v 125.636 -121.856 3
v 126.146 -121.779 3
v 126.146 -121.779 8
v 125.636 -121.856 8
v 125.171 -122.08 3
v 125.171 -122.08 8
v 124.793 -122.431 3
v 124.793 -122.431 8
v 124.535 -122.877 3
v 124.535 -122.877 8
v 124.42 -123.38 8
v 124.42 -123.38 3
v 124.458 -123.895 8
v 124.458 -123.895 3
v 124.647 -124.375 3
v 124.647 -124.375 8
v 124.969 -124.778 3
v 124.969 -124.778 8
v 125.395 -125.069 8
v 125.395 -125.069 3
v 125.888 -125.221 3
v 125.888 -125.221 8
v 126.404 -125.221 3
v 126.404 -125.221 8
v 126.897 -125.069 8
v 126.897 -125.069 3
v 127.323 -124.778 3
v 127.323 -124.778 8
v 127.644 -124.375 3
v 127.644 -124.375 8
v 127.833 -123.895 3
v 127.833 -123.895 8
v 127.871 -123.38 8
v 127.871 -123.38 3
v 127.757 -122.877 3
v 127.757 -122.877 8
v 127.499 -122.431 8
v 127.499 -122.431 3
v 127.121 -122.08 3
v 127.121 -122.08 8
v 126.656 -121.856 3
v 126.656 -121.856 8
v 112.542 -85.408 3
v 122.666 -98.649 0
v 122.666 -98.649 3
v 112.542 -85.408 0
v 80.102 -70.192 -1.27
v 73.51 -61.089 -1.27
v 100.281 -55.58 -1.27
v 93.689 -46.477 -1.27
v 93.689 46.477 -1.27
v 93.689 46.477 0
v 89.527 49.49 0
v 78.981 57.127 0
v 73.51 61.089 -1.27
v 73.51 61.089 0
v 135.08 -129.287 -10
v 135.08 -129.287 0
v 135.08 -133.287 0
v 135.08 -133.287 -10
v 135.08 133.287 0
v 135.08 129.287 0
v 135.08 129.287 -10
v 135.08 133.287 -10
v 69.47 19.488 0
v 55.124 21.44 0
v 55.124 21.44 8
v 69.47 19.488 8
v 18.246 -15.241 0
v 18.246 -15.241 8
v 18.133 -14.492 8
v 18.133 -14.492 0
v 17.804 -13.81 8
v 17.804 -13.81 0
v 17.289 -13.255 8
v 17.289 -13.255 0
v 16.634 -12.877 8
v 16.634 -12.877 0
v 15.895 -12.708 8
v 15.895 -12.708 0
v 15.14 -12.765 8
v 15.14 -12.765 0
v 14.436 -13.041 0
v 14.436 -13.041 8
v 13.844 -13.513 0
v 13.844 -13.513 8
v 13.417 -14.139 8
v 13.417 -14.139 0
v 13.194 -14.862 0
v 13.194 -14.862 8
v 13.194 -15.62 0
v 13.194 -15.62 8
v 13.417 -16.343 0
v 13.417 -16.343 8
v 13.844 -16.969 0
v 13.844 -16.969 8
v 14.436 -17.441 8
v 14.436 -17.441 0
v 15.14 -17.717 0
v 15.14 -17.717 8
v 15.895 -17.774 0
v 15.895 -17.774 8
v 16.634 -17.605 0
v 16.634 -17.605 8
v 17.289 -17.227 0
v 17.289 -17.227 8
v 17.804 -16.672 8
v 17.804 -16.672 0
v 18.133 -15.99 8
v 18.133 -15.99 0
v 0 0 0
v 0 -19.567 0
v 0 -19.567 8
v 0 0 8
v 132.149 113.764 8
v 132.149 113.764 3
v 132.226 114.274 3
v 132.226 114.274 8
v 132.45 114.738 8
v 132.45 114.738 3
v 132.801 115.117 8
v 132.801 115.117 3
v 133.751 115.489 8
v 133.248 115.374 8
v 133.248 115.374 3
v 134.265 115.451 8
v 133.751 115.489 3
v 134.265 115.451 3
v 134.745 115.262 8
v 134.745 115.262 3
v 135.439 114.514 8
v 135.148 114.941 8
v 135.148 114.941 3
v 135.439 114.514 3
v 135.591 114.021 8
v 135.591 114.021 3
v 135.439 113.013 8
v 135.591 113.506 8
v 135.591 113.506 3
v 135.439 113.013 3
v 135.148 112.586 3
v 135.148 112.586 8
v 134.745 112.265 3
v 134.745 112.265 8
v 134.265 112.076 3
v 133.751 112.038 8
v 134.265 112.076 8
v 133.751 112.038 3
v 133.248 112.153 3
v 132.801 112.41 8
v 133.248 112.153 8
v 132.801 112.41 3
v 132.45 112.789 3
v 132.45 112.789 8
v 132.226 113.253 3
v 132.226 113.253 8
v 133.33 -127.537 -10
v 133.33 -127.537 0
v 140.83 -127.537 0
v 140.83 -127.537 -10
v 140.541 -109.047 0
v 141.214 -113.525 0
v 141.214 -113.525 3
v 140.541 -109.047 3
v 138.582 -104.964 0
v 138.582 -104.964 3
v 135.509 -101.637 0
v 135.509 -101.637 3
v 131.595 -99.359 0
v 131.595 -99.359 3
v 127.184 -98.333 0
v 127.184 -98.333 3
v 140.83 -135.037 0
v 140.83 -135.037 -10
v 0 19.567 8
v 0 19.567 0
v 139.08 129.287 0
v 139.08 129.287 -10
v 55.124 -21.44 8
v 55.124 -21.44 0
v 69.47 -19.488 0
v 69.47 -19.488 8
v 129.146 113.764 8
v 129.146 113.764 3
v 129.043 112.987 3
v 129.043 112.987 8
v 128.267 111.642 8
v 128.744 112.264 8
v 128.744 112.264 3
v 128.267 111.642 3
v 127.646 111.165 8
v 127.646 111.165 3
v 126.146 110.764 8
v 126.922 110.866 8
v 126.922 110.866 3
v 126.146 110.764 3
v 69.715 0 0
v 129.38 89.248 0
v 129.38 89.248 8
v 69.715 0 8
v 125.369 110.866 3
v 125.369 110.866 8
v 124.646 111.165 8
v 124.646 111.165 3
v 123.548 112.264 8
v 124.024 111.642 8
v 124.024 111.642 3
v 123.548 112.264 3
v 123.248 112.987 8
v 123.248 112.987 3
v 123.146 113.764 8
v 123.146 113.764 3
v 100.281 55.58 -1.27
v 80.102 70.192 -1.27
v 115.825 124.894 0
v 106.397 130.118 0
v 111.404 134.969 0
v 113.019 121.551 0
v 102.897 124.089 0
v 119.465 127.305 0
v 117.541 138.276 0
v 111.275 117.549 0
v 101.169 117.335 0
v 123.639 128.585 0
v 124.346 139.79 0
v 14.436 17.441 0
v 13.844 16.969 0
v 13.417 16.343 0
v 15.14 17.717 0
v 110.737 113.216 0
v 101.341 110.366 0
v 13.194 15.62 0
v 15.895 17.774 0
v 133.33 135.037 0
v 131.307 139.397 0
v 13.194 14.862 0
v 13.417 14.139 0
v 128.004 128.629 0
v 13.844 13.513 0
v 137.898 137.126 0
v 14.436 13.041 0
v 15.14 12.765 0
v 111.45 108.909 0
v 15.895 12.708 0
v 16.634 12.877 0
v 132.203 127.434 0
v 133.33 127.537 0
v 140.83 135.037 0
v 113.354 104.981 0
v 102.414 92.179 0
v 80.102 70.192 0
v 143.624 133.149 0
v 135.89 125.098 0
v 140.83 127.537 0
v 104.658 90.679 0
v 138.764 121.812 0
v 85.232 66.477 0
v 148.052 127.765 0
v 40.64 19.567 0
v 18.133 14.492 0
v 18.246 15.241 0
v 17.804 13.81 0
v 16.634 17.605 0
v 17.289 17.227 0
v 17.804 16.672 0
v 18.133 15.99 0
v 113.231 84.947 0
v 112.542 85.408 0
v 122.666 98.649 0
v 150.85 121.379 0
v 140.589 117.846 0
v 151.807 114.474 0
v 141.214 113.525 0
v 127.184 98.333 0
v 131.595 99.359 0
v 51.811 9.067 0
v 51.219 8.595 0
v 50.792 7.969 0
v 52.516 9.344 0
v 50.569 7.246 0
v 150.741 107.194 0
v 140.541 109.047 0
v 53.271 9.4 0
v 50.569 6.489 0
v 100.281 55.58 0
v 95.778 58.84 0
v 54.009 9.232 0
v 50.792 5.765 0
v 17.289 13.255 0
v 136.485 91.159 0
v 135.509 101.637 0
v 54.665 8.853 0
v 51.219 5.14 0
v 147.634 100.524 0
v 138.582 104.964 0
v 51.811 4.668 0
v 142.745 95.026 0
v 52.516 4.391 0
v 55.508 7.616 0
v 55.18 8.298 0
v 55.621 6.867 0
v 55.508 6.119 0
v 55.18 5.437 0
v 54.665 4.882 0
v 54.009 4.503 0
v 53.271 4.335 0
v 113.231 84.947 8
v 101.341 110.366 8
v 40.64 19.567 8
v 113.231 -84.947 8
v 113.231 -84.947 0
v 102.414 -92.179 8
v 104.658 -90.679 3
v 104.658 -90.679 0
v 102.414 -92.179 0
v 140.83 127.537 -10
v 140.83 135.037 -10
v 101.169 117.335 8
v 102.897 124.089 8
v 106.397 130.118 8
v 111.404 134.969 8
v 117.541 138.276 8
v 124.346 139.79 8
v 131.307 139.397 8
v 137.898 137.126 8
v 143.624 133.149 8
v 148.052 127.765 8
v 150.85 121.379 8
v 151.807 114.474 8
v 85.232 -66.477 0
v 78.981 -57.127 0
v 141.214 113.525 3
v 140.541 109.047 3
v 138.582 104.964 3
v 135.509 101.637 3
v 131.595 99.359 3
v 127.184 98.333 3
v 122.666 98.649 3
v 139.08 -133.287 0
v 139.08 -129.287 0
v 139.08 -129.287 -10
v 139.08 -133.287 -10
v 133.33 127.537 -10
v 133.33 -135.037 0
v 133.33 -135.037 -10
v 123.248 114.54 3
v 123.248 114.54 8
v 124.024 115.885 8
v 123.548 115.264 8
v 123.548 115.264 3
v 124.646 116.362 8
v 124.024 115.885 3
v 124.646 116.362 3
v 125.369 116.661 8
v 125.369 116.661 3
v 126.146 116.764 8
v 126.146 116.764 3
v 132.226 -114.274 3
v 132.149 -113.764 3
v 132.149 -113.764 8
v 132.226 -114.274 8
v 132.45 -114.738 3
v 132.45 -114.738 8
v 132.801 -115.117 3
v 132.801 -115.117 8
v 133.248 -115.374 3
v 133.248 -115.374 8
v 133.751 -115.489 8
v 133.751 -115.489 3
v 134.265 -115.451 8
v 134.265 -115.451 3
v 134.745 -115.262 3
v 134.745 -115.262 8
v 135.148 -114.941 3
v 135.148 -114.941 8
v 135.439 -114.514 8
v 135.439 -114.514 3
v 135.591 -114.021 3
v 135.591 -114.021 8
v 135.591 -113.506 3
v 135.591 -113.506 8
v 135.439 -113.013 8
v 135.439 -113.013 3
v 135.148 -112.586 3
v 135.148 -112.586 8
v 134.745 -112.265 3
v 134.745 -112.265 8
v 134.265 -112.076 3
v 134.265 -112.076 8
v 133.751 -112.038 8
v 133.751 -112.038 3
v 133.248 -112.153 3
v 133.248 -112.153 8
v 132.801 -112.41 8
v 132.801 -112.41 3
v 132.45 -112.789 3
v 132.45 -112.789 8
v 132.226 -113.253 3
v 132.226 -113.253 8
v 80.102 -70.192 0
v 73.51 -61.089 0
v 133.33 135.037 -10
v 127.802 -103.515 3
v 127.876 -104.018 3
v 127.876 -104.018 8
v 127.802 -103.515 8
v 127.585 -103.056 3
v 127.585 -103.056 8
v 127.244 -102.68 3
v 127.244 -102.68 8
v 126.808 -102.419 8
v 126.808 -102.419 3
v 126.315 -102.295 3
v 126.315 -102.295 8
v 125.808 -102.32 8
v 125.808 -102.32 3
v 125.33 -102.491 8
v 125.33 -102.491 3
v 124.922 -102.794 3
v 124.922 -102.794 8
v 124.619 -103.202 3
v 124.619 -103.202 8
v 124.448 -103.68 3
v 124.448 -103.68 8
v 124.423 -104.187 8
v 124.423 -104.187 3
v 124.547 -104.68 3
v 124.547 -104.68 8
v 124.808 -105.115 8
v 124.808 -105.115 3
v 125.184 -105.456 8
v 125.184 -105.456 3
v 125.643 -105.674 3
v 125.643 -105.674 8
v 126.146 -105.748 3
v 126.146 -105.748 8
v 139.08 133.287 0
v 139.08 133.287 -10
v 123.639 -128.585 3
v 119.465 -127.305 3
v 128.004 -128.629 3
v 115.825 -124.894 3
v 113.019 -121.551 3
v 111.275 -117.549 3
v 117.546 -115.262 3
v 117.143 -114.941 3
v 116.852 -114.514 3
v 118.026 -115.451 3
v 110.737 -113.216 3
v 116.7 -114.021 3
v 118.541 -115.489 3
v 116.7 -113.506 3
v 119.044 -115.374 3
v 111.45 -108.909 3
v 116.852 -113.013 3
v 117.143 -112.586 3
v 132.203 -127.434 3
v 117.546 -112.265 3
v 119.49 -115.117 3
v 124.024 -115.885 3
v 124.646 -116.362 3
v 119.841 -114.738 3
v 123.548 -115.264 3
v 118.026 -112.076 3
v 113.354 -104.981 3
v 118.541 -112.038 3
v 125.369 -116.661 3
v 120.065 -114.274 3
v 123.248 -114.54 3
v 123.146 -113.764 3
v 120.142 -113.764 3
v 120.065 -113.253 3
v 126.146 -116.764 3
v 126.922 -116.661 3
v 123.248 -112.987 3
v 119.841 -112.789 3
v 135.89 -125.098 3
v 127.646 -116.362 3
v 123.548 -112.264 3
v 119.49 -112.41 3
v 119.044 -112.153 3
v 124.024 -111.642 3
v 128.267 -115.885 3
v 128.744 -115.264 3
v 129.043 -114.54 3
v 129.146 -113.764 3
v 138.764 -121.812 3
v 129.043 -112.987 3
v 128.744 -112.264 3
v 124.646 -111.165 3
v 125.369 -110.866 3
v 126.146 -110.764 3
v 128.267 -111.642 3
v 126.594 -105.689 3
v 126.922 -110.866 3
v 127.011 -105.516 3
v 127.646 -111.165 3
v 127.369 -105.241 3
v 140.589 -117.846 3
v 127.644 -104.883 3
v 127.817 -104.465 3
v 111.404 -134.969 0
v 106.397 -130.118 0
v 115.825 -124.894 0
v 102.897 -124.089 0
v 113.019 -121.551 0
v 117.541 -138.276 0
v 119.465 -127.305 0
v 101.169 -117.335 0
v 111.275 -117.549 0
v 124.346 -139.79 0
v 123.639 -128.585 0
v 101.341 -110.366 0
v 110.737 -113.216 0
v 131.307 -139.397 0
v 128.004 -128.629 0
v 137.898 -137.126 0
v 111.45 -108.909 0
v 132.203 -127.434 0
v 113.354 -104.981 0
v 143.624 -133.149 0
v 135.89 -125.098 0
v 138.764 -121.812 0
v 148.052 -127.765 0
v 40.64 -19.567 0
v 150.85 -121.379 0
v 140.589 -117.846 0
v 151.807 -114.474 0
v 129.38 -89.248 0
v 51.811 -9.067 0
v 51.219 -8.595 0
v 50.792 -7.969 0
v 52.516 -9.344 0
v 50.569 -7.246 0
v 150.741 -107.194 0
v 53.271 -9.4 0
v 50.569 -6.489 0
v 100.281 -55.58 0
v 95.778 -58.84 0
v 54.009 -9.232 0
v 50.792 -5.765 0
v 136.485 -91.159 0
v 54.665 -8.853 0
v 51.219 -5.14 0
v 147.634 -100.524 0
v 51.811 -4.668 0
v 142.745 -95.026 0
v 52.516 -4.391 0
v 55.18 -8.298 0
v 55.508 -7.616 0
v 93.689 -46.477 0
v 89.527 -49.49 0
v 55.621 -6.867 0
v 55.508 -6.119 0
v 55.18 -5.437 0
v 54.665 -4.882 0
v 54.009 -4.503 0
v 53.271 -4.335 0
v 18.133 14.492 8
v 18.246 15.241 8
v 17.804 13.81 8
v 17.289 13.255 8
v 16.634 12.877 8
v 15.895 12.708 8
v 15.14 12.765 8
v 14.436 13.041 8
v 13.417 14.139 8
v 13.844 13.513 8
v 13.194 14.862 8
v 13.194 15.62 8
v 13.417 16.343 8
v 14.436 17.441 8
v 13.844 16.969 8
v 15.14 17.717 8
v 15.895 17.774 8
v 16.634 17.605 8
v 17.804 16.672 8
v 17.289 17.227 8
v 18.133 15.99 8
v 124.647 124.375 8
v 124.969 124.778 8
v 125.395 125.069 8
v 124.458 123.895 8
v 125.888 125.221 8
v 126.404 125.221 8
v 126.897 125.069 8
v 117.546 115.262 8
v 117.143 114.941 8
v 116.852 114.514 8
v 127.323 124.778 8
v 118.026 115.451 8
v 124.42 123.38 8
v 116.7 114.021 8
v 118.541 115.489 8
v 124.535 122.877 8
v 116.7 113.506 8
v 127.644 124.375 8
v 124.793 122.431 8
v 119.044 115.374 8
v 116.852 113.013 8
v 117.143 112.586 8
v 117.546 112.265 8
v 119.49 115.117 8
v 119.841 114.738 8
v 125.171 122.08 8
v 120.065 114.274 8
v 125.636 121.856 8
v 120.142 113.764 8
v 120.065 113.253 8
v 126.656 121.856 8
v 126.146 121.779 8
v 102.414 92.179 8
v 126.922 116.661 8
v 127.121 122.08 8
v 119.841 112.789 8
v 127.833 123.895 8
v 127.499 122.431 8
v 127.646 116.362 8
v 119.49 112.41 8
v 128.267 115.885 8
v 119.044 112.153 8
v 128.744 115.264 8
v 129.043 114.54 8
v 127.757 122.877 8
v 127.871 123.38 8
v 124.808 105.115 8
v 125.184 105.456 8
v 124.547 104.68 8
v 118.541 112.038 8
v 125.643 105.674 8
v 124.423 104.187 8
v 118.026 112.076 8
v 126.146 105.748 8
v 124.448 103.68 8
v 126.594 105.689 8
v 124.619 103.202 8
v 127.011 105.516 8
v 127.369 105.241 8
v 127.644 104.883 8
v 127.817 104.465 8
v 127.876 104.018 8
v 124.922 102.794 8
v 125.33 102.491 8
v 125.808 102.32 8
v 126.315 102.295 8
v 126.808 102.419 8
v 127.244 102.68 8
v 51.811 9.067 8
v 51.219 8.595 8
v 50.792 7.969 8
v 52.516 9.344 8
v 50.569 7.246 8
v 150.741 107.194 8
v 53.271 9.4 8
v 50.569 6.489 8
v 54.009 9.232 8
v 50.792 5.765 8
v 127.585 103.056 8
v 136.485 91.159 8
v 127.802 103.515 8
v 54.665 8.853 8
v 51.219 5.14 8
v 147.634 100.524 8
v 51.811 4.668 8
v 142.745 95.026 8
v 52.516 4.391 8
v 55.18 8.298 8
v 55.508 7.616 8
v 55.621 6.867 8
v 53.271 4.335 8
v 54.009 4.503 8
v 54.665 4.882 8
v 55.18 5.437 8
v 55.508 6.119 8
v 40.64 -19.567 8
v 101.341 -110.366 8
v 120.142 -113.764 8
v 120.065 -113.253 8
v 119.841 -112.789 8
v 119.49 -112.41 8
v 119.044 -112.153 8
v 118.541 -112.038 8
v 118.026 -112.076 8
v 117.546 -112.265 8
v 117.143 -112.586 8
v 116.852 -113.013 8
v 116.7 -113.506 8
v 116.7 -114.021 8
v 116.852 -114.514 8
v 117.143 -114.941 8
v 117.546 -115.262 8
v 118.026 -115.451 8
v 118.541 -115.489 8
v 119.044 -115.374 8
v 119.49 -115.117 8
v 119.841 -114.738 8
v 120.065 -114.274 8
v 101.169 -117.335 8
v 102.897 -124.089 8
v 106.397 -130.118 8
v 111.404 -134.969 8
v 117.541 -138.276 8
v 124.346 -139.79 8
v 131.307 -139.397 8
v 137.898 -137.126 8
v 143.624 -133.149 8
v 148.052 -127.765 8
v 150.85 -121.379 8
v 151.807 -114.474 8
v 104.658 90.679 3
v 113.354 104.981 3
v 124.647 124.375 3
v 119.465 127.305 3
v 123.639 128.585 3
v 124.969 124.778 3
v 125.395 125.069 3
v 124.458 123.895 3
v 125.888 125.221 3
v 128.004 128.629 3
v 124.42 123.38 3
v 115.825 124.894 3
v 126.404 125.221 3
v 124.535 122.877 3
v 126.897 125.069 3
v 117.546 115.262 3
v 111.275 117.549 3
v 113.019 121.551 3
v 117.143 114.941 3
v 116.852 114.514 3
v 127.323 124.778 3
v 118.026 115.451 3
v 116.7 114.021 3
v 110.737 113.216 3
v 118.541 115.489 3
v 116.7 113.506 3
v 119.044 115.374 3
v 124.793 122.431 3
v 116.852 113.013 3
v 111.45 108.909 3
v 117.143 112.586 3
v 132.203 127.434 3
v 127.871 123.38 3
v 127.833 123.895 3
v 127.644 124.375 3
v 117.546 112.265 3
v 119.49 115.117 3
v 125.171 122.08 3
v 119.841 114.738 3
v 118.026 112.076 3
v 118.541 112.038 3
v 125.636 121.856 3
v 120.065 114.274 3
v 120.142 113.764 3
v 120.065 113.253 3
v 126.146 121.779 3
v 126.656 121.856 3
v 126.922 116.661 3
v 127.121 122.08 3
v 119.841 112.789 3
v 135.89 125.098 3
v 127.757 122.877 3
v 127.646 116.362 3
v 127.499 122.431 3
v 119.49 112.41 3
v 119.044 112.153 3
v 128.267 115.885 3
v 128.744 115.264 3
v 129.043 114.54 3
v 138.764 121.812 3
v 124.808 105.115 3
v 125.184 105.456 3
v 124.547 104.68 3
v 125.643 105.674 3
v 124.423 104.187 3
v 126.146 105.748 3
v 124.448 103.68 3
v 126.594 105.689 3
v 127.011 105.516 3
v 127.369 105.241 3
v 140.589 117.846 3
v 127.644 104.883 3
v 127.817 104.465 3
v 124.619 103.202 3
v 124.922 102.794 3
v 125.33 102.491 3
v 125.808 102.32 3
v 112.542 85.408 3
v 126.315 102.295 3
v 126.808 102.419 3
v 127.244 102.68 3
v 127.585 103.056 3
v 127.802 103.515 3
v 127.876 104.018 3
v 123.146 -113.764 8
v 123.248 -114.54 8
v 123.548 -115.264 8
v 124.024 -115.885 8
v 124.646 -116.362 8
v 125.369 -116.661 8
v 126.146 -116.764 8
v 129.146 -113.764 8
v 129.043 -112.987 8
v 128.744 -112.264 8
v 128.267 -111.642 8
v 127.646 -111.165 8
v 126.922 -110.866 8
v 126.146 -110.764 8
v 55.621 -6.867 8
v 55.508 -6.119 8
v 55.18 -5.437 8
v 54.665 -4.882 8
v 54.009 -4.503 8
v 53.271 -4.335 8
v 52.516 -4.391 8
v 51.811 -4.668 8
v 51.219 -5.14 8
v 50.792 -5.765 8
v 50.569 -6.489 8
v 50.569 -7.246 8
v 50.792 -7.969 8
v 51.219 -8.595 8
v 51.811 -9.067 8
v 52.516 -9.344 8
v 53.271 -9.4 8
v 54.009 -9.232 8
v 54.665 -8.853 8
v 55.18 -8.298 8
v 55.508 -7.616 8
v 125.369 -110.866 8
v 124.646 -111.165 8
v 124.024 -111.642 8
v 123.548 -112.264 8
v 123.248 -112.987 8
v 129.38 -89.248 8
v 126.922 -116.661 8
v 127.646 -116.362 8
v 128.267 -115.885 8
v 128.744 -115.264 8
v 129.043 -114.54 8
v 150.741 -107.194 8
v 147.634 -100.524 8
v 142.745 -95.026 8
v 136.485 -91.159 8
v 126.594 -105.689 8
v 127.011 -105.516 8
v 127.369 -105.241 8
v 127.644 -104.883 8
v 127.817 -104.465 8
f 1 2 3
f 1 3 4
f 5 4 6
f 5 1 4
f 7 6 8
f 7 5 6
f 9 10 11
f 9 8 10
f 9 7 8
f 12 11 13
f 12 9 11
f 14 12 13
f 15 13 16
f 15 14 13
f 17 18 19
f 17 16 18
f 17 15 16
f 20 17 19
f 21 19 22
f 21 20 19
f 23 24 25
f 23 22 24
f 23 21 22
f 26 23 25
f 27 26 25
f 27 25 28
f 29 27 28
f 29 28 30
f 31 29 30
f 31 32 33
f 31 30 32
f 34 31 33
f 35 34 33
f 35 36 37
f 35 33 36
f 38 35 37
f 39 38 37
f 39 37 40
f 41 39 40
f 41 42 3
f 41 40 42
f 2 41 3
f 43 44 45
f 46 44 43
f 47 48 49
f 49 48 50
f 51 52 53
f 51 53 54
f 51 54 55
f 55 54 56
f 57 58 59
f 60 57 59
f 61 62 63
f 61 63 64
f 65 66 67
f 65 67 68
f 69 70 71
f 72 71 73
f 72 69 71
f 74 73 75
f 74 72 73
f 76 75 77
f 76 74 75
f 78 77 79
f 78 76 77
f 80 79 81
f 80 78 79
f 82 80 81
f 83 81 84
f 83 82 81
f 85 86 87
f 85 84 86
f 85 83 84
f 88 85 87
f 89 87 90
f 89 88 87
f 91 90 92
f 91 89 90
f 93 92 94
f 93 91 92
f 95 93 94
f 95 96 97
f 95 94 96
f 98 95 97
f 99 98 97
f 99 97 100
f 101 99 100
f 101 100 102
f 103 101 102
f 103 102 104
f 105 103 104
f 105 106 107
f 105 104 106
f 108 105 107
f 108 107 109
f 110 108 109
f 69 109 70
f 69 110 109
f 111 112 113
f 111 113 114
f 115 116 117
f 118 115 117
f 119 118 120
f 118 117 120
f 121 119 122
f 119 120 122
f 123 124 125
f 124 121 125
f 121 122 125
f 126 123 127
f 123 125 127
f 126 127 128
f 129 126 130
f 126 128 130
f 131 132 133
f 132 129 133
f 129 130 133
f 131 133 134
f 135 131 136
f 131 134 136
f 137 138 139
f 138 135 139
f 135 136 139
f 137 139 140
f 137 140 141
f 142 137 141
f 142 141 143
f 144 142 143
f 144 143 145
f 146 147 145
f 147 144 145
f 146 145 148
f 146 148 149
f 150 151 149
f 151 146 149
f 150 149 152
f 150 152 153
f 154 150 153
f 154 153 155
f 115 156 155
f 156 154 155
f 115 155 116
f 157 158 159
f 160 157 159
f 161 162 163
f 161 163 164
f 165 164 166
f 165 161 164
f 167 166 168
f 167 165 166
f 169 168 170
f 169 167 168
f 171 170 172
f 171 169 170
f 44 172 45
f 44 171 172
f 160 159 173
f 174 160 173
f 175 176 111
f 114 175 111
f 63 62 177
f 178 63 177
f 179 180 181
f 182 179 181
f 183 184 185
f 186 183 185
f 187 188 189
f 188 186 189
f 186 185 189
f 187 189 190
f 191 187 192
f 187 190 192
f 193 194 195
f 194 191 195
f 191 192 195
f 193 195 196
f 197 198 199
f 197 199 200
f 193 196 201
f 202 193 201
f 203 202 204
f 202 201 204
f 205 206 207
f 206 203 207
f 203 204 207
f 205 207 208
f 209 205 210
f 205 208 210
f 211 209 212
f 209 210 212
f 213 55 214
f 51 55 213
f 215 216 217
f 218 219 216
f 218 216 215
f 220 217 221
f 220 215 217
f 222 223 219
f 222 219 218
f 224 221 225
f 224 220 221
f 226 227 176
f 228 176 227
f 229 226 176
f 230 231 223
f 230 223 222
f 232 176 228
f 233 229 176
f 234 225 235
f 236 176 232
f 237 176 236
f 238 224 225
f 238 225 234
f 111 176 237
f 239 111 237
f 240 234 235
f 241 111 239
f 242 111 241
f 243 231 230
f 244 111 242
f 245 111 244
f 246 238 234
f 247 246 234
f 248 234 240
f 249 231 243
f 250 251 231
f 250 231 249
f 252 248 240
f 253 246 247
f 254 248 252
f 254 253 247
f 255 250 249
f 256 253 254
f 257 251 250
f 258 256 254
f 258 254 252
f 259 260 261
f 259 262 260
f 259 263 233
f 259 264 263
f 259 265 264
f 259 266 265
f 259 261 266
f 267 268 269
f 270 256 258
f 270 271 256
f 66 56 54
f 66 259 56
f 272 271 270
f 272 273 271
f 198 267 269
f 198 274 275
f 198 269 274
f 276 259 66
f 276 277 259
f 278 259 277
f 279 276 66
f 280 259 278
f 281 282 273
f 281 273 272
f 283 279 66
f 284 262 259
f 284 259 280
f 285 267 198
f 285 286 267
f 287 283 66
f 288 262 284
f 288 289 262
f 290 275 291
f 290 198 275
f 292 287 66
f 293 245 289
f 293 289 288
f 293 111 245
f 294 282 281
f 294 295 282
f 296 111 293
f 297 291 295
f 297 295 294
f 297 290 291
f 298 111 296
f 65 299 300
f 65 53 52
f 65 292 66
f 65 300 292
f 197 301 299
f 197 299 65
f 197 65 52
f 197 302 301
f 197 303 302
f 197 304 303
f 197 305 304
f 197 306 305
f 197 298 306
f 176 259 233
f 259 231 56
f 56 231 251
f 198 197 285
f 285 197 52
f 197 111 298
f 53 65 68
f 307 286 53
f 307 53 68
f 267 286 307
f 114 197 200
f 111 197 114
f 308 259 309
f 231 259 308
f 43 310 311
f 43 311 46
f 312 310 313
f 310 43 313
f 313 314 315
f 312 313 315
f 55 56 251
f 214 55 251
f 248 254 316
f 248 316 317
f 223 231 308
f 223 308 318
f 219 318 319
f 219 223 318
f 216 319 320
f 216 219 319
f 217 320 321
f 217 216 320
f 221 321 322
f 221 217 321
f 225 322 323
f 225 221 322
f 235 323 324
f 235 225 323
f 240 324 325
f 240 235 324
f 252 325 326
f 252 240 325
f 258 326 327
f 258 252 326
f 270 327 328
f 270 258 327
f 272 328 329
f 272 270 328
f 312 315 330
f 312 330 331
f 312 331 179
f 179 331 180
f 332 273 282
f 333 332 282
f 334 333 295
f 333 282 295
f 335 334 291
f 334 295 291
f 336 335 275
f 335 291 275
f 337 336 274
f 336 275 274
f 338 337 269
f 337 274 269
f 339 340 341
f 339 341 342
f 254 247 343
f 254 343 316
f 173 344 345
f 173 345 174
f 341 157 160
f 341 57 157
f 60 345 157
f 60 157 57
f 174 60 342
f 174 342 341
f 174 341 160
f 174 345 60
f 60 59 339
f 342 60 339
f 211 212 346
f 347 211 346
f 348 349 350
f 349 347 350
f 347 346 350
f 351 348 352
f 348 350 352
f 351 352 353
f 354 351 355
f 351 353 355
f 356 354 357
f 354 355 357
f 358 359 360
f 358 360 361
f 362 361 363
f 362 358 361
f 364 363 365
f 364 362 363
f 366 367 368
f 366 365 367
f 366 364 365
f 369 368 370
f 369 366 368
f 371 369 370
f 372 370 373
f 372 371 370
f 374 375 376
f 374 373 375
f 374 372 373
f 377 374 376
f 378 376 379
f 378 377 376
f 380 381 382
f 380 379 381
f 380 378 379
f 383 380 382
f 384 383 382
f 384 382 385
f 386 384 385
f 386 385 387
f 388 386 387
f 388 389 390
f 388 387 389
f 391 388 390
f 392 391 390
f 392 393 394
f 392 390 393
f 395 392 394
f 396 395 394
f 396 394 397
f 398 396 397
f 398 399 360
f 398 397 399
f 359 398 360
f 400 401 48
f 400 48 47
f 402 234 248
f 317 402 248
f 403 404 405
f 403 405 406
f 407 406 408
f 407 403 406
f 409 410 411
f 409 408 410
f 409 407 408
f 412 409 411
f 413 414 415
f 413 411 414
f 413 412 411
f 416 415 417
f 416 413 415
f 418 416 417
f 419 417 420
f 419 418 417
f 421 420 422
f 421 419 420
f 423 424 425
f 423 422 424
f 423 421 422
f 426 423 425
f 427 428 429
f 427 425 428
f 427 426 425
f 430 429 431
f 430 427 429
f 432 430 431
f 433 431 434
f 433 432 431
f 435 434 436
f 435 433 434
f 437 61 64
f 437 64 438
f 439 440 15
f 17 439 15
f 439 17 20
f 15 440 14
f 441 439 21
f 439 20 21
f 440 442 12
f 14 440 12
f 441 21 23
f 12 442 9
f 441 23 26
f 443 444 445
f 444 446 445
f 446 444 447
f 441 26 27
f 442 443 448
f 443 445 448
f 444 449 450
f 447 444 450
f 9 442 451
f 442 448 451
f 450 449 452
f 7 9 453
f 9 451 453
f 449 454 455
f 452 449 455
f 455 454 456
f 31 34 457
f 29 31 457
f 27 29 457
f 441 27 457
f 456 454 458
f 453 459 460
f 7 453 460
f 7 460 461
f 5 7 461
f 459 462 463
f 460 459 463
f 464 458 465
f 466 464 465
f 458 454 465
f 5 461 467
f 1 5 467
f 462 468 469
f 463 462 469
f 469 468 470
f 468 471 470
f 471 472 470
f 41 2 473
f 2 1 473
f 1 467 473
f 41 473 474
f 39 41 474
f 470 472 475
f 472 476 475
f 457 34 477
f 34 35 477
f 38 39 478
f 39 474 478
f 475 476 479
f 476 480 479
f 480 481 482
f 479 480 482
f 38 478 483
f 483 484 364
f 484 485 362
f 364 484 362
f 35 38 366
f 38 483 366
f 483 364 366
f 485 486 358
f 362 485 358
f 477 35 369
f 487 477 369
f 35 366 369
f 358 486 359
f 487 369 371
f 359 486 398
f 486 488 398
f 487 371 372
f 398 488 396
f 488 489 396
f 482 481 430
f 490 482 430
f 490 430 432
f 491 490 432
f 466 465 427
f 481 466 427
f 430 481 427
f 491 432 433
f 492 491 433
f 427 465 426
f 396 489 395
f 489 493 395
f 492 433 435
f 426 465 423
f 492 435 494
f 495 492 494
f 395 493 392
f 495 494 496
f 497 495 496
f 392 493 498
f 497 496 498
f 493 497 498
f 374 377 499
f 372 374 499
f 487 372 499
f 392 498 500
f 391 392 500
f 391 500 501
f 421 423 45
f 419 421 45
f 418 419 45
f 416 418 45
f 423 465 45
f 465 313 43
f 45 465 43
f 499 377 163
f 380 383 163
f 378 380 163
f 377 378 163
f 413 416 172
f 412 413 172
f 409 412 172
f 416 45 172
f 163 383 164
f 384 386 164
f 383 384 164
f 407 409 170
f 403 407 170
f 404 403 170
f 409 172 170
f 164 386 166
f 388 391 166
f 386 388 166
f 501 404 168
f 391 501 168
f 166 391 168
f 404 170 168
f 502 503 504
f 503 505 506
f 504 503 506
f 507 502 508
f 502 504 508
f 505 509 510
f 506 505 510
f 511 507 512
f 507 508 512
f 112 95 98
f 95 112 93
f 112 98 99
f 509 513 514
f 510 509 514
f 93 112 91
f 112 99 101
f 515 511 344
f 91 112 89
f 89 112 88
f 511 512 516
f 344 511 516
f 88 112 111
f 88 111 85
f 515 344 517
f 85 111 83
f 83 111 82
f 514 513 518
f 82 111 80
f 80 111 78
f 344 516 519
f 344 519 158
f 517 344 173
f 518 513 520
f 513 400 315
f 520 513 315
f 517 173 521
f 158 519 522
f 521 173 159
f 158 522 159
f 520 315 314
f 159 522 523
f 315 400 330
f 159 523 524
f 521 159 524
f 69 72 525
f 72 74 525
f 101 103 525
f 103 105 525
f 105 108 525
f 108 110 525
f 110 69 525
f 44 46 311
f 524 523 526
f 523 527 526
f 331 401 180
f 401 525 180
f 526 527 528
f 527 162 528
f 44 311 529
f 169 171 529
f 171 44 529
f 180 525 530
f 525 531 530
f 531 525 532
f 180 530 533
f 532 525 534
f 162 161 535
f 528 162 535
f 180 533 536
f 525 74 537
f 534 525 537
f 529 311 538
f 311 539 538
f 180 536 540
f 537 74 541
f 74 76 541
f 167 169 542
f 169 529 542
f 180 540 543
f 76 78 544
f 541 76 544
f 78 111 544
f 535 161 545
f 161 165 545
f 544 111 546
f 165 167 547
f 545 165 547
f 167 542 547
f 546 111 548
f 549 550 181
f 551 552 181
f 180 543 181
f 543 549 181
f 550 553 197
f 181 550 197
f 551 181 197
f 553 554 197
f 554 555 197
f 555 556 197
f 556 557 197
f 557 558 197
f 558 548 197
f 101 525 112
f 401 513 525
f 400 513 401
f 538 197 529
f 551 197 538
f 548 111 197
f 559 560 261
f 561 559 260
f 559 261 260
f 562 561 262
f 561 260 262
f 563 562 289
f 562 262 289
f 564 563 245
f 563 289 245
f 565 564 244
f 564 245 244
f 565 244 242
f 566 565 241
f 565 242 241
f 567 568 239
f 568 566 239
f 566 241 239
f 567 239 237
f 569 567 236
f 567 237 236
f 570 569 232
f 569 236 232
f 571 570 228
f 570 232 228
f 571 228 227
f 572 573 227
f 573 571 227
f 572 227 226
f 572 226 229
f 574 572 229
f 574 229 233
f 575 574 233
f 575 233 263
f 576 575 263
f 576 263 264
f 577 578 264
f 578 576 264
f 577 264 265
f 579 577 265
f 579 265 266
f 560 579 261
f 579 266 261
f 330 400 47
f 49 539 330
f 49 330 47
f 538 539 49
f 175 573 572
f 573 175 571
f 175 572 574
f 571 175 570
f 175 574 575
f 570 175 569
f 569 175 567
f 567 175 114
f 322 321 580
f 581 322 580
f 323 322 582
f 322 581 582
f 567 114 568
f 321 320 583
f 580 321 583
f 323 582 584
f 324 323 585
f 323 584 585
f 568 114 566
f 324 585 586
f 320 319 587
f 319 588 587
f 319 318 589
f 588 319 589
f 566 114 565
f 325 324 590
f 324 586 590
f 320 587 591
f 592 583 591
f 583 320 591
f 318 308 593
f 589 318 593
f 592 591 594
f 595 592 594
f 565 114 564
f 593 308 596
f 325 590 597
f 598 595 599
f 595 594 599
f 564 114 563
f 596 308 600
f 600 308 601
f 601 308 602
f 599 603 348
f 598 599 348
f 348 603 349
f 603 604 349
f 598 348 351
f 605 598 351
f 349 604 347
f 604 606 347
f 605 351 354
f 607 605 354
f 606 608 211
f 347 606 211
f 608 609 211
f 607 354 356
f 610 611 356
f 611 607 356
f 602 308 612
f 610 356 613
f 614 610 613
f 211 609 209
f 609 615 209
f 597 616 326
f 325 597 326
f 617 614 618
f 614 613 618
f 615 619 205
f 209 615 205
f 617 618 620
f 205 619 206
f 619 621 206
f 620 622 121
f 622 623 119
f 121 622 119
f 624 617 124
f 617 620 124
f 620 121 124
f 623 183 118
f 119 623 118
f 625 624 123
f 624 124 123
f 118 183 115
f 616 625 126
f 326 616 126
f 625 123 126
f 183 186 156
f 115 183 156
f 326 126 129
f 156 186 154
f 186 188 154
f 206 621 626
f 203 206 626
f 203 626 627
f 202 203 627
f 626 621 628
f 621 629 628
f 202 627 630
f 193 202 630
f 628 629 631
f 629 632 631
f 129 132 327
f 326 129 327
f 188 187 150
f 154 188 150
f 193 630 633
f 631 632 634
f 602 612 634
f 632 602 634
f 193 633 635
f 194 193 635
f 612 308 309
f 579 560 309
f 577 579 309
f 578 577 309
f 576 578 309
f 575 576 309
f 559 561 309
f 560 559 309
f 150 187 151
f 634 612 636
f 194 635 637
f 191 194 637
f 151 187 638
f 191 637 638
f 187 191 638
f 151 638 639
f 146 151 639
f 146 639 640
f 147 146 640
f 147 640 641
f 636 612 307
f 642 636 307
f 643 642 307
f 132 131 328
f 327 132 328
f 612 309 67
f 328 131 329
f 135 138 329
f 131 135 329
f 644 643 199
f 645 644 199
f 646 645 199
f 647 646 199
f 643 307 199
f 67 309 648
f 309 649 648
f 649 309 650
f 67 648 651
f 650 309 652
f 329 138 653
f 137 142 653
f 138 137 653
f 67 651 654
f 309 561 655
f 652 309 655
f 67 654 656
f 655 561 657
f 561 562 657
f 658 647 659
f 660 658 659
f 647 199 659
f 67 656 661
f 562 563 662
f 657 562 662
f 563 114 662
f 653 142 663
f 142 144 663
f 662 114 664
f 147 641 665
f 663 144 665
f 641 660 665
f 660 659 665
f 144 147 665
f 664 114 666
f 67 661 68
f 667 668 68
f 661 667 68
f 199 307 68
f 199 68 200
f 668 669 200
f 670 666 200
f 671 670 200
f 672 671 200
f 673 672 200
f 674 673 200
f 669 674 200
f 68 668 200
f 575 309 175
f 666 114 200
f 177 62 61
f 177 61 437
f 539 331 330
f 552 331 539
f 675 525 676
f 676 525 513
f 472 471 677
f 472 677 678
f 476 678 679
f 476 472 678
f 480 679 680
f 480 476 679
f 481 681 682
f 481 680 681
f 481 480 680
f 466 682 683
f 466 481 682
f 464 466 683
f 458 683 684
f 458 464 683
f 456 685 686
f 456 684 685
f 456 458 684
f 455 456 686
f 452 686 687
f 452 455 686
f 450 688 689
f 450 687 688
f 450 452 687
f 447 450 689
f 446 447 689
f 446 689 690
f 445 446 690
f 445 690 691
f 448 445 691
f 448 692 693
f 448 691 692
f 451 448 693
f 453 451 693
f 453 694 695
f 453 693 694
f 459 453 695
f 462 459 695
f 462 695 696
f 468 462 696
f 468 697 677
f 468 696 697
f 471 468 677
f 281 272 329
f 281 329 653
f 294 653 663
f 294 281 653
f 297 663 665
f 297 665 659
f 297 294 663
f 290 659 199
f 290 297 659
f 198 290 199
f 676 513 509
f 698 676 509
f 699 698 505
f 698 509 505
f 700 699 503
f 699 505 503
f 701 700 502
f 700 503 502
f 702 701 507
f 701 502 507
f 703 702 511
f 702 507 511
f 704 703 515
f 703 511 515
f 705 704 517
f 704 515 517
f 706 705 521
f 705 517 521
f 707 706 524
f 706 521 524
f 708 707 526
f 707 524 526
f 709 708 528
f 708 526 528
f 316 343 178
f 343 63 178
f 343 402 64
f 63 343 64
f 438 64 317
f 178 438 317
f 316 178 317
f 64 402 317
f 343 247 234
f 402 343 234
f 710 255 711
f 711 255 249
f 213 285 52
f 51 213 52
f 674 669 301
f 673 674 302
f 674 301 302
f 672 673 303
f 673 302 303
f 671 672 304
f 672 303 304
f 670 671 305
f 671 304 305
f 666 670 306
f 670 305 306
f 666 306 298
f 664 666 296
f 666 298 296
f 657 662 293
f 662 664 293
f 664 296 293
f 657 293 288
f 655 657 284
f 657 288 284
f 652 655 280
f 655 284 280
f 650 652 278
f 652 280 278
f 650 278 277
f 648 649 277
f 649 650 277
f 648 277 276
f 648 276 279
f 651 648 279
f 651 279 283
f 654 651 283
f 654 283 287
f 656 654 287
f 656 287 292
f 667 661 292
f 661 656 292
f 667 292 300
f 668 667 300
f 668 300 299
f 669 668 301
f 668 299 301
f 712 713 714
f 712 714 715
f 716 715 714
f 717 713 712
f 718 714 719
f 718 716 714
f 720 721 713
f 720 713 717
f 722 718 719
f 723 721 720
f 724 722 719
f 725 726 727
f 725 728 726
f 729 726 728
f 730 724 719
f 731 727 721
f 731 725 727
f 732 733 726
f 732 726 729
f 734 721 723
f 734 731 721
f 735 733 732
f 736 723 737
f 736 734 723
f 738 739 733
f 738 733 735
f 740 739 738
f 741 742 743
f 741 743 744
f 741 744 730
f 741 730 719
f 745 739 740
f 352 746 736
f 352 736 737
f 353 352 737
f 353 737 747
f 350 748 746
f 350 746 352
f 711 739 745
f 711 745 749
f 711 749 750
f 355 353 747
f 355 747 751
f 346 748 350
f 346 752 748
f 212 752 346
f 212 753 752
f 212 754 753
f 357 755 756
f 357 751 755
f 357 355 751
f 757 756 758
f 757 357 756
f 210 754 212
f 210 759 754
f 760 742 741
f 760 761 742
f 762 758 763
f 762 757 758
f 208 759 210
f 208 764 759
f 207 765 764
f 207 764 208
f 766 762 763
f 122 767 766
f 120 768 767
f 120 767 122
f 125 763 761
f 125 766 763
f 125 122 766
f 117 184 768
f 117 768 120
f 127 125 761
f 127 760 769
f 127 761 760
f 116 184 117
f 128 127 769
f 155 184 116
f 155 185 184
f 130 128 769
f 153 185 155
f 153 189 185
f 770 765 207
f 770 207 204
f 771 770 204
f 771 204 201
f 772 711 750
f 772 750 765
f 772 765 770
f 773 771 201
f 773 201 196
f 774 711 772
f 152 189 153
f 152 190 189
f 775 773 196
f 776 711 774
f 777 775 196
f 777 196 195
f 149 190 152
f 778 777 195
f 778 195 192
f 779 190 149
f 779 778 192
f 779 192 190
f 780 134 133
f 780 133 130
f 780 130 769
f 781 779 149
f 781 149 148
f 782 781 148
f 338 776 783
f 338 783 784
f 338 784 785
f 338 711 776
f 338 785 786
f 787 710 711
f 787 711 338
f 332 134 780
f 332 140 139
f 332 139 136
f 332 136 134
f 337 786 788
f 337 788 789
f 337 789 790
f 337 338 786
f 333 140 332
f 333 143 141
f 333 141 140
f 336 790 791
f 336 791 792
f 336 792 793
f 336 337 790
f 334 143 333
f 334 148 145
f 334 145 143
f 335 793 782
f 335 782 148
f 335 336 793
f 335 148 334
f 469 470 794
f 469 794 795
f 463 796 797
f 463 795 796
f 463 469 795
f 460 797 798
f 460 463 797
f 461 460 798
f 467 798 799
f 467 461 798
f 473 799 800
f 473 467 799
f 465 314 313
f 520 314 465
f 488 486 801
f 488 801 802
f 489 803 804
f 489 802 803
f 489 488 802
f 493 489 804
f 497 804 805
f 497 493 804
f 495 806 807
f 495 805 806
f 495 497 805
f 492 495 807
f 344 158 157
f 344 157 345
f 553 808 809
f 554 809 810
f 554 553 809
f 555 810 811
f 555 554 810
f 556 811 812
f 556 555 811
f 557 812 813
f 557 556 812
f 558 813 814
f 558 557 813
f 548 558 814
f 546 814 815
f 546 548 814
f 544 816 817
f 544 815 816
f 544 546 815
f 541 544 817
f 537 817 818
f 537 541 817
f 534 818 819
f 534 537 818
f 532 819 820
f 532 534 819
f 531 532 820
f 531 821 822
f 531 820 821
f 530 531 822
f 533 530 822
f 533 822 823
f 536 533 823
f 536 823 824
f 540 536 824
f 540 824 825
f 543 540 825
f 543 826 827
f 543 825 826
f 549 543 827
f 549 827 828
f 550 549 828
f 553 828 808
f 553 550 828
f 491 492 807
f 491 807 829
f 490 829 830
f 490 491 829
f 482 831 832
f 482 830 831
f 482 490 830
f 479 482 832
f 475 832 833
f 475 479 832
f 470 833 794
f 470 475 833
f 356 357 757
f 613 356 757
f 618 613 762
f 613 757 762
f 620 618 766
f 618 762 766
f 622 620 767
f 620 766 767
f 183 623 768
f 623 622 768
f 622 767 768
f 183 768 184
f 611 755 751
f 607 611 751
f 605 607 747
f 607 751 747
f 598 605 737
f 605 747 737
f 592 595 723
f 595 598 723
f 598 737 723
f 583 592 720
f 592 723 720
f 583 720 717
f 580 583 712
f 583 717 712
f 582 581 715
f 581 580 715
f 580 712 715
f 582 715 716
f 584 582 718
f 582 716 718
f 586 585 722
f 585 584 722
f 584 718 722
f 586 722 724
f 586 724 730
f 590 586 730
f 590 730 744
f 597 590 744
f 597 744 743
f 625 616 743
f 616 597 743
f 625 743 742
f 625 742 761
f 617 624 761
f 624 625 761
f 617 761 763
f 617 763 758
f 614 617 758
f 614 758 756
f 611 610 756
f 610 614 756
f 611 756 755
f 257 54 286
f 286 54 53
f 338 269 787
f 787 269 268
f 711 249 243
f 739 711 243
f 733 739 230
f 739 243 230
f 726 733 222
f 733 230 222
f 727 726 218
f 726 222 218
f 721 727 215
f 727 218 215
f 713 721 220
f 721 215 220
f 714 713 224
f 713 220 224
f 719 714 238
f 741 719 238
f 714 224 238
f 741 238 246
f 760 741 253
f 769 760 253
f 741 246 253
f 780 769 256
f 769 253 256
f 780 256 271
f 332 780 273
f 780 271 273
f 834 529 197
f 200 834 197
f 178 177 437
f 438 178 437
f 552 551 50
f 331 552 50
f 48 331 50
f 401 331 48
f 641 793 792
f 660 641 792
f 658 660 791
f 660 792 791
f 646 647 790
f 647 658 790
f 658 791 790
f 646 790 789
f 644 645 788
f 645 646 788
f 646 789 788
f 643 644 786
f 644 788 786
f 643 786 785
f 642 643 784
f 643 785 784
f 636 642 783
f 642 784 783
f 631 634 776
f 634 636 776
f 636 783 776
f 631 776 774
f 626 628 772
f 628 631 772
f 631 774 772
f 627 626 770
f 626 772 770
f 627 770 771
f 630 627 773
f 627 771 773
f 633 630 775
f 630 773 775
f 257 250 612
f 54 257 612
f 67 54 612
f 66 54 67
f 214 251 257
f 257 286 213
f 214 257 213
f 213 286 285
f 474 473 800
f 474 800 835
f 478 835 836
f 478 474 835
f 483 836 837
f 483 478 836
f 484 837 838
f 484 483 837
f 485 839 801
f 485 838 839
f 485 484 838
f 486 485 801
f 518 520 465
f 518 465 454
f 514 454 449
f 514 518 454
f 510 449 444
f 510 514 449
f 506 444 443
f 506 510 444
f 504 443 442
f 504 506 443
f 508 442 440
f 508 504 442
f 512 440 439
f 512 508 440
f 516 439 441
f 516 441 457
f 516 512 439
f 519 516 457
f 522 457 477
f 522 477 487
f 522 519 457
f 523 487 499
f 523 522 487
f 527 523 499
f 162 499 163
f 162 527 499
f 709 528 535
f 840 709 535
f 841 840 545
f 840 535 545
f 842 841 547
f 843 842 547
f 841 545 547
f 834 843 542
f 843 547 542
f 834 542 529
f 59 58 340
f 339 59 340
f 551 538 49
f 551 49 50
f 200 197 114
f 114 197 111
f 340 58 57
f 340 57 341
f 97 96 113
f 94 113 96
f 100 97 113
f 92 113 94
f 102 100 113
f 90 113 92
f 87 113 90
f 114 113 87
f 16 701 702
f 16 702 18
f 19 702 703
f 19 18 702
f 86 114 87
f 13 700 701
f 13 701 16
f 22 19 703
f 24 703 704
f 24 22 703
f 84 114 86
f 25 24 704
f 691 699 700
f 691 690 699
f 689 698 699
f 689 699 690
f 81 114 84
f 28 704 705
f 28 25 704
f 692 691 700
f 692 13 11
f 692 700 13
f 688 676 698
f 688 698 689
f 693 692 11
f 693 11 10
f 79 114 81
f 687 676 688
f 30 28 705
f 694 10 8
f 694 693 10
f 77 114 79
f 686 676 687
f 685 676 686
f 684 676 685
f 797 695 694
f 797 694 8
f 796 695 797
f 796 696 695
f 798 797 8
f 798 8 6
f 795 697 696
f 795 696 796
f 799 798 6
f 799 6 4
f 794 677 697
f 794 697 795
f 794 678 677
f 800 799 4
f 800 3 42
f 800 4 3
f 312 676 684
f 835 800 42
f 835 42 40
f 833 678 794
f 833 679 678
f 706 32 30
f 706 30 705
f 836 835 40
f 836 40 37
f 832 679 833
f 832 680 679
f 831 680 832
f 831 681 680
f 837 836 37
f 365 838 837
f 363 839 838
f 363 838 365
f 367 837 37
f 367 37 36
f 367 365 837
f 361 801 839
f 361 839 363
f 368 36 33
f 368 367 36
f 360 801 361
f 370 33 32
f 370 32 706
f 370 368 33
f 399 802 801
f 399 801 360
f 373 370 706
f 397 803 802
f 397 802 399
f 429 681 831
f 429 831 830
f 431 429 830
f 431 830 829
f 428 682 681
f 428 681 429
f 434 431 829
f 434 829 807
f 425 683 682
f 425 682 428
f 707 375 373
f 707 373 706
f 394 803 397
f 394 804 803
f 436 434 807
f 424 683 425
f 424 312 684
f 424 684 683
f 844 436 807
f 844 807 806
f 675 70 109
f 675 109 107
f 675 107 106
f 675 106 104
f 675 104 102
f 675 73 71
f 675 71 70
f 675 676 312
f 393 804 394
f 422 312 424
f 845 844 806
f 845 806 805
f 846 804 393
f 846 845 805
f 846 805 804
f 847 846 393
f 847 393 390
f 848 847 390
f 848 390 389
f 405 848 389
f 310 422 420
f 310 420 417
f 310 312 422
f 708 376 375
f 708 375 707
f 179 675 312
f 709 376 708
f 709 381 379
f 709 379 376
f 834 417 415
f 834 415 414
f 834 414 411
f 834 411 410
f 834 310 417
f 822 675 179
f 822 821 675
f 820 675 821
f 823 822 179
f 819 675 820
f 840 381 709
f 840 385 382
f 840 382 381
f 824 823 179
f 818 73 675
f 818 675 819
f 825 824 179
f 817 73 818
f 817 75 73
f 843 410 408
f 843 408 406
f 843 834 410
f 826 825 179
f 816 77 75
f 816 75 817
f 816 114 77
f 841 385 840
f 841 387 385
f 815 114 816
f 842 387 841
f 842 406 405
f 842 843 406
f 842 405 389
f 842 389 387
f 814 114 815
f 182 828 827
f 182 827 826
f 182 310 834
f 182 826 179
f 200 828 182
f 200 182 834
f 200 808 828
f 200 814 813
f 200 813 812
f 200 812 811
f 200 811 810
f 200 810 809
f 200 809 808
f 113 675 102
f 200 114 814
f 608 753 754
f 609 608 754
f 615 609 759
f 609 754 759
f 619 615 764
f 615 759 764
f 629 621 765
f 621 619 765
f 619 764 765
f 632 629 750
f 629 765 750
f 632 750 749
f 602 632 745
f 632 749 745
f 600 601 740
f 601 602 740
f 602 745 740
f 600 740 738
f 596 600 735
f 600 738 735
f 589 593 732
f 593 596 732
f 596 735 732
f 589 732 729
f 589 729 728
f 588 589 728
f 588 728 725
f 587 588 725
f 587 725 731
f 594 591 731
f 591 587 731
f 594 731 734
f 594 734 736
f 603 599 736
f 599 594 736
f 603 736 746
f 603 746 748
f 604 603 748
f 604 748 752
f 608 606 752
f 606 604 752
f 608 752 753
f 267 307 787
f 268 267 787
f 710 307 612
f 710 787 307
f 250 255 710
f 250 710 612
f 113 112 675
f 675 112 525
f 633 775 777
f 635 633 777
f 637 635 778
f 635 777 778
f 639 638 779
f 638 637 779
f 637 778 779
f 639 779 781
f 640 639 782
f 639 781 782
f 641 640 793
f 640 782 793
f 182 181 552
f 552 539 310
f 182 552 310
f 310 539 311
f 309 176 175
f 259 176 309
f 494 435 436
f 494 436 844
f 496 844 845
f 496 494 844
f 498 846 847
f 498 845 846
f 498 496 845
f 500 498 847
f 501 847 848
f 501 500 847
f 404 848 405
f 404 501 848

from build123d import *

# Parameters (mm, degrees)
F0_W     = 40.64
F0_H     = 19.5674088302
F1_DEPTH = 8.0000094
F2_R     = 2.54
F2_R_2   = 1.7305909
F3_DEPTH = 101.854
F5_DEPTH = 3
F7_DEPTH = 1.27
F8_W     = 7.5
F8_H     = 7.5
F8_W_2   = 4
F8_H_2   = 4
F9_DEPTH = 10


with BuildPart() as f1:
    # F0 (on Top) → F1 (new body)
    with BuildSketch(Plane.XY):
        with Locations((20.32, -9.7837044151)):
            Rectangle(F0_W, F0_H)
        with BuildLine():
            Line((69.7148357365, 0), (40.64, 0))
            Line((40.64, 0), (40.64, -19.5674088302))
            Line((40.64, -19.5674088302), (101.3413866648, -110.3658122135))
            ThreePointArc((101.3413866648, -110.3658122135), (111.1260073492, -94.18453836), (129.3799410465, -89.2483120652))
            Line((129.3799410465, -89.2483120652), (69.7148357365, 0))
        make_face()
        Polygon((69.4696214672, -19.4881020028), (113.231086272, -84.9474160699), (102.4144638083, -92.1786443526), (55.123848616, -21.4403533447), align=None, mode=Mode.SUBTRACT)
        with BuildLine():
            ThreePointArc((129.3799410465, -89.2483120652), (111.1260073492, -94.18453836), (101.3413866648, -110.3658122135))
            ThreePointArc((101.3413866648, -110.3658122135), (124.3462494405, -139.7899939485), (151.8070010567, -114.4737283713))
            ThreePointArc((151.8070010567, -114.4737283713), (145.3895282296, -97.5970088402), (129.3799410465, -89.2483120652))
        make_face()
    extrude(amount=F1_DEPTH)

    # F2 (on Top) → F3 (cut)
    with BuildSketch(Plane.XY):
        with Locations((15.7056836, -15.2410668)):
            Circle(F2_R)
        with BuildLine():
            Line((126.1456662068, -113.7635194558), (129.1456602068, -113.7635194558))
            ThreePointArc((129.1456602068, -113.7635194558), (128.2669823077, -111.6422033549), (126.1456662068, -110.7635254558))
            Line((126.1456662068, -110.7635254558), (126.1456662068, -113.7635194558))
        make_face()
        with BuildLine():
            ThreePointArc((127.8762571068, -123.5095248558), (127.3693787677, -122.285812295), (126.1456662068, -121.7789339558))
            ThreePointArc((126.1456662068, -121.7789339558), (124.921953646, -124.7332374167), (127.8762571068, -123.5095248558))
        make_face()
        with Locations((118.4114652668, -113.7635194558)):
            Circle(F2_R_2)
        with BuildLine():
            ThreePointArc((127.8762571068, -104.0175140558), (124.921953646, -102.793801495), (126.1456662068, -105.7481049558))
            ThreePointArc((126.1456662068, -105.7481049558), (127.3693787677, -105.2412266167), (127.8762571068, -104.0175140558))
        make_face()
        with BuildLine():
            ThreePointArc((126.1456662068, -116.7635134558), (128.2669823077, -115.8848355568), (129.1456602068, -113.7635194558))
            Line((129.1456602068, -113.7635194558), (126.1456662068, -113.7635194558))
            Line((126.1456662068, -113.7635194558), (126.1456662068, -116.7635134558))
        make_face()
        with BuildLine():
            ThreePointArc((135.6104580468, -113.7635194558), (133.8798671468, -112.0329285558), (132.1492762468, -113.7635194558))
            ThreePointArc((132.1492762468, -113.7635194558), (133.8798671468, -115.4941103558), (135.6104580468, -113.7635194558))
        make_face()
        with BuildLine():
            Line((126.1456662068, -113.7635194558), (126.1456662068, -110.7635254558))
            ThreePointArc((126.1456662068, -110.7635254558), (124.0243501059, -111.6422033549), (123.1456722068, -113.7635194558))
            Line((123.1456722068, -113.7635194558), (126.1456662068, -113.7635194558))
        make_face()
        with BuildLine():
            ThreePointArc((123.1456722068, -113.7635194558), (124.0243501059, -115.8848355568), (126.1456662068, -116.7635134558))
            Line((126.1456662068, -116.7635134558), (126.1456662068, -113.7635194558))
            Line((126.1456662068, -113.7635194558), (123.1456722068, -113.7635194558))
        make_face()
        with Locations((53.08092, -6.8674)):
            Circle(F2_R)
    extrude(amount=F3_DEPTH, mode=Mode.SUBTRACT)

    # F4 (on Top) → F5 (cut)
    with BuildSketch(Plane.XY):
        with BuildLine():
            ThreePointArc((113.3543175896, -104.9811791667), (121.5057123257, -128.0953658898), (141.2140740061, -113.5251447558))
            ThreePointArc((141.2140740061, -113.5251447558), (135.5093324535, -101.6366441633), (122.6659839352, -98.6485140861))
            Line((122.6659839352, -98.6485140861), (113.3844923675, -105.0308045977))
            Line((113.3844923675, -105.0308045977), (113.3543175896, -104.9811791667))
        make_face()
        with BuildLine():
            Line((113.3844923675, -105.0308045977), (122.6659839352, -98.6485140861))
            ThreePointArc((122.6659839352, -98.6485140861), (117.4037919112, -100.9232455016), (113.3543175896, -104.9811791667))
            Line((113.3543175896, -104.9811791667), (113.3844923675, -105.0308045977))
        make_face()
        with BuildLine():
            ThreePointArc((113.3543175896, -104.9811791667), (117.4037919112, -100.9232455016), (122.6659839352, -98.6485140861))
            Line((122.6659839352, -98.6485140861), (112.1151074767, -84.8500952125))
            Line((112.1151074767, -84.8500952125), (104.2779775574, -90.0542329821))
            Line((104.2779775574, -90.0542329821), (113.3543175896, -104.9811791667))
        make_face()
    extrude(amount=F5_DEPTH, mode=Mode.SUBTRACT)

    # F6 (on Top) → F7 (join)
    with BuildSketch(Plane.XY):
        Polygon((73.5100944723, -61.0887857915), (80.1020091825, -70.1919157745), (100.2806708766, -55.5797969646), (93.6887561665, -46.4766669816), align=None)
    extrude(amount=-F7_DEPTH)

    # F8 (on face) → F9 (join)
    with BuildSketch(Plane(origin=(0, 0, 0), x_dir=(1, 0, 0), z_dir=(0, 0, -1))):
        with Locations((137.0798796415, 131.2868020968)):
            Rectangle(F8_W, F8_H)
        with Locations((137.0798796415, 131.2868020968)):
            Rectangle(F8_W_2, F8_H_2, mode=Mode.SUBTRACT)
    extrude(amount=F9_DEPTH)


with BuildPart() as f10_1:
    # F10: instance of F1
    add(f1.part.mirror(Plane(origin=(34.8574178682, 0, 4.0000047), x_dir=(-1, 0, 0), z_dir=(0, 1, 0))))


solid = Compound([f1.part, f10_1.part])
